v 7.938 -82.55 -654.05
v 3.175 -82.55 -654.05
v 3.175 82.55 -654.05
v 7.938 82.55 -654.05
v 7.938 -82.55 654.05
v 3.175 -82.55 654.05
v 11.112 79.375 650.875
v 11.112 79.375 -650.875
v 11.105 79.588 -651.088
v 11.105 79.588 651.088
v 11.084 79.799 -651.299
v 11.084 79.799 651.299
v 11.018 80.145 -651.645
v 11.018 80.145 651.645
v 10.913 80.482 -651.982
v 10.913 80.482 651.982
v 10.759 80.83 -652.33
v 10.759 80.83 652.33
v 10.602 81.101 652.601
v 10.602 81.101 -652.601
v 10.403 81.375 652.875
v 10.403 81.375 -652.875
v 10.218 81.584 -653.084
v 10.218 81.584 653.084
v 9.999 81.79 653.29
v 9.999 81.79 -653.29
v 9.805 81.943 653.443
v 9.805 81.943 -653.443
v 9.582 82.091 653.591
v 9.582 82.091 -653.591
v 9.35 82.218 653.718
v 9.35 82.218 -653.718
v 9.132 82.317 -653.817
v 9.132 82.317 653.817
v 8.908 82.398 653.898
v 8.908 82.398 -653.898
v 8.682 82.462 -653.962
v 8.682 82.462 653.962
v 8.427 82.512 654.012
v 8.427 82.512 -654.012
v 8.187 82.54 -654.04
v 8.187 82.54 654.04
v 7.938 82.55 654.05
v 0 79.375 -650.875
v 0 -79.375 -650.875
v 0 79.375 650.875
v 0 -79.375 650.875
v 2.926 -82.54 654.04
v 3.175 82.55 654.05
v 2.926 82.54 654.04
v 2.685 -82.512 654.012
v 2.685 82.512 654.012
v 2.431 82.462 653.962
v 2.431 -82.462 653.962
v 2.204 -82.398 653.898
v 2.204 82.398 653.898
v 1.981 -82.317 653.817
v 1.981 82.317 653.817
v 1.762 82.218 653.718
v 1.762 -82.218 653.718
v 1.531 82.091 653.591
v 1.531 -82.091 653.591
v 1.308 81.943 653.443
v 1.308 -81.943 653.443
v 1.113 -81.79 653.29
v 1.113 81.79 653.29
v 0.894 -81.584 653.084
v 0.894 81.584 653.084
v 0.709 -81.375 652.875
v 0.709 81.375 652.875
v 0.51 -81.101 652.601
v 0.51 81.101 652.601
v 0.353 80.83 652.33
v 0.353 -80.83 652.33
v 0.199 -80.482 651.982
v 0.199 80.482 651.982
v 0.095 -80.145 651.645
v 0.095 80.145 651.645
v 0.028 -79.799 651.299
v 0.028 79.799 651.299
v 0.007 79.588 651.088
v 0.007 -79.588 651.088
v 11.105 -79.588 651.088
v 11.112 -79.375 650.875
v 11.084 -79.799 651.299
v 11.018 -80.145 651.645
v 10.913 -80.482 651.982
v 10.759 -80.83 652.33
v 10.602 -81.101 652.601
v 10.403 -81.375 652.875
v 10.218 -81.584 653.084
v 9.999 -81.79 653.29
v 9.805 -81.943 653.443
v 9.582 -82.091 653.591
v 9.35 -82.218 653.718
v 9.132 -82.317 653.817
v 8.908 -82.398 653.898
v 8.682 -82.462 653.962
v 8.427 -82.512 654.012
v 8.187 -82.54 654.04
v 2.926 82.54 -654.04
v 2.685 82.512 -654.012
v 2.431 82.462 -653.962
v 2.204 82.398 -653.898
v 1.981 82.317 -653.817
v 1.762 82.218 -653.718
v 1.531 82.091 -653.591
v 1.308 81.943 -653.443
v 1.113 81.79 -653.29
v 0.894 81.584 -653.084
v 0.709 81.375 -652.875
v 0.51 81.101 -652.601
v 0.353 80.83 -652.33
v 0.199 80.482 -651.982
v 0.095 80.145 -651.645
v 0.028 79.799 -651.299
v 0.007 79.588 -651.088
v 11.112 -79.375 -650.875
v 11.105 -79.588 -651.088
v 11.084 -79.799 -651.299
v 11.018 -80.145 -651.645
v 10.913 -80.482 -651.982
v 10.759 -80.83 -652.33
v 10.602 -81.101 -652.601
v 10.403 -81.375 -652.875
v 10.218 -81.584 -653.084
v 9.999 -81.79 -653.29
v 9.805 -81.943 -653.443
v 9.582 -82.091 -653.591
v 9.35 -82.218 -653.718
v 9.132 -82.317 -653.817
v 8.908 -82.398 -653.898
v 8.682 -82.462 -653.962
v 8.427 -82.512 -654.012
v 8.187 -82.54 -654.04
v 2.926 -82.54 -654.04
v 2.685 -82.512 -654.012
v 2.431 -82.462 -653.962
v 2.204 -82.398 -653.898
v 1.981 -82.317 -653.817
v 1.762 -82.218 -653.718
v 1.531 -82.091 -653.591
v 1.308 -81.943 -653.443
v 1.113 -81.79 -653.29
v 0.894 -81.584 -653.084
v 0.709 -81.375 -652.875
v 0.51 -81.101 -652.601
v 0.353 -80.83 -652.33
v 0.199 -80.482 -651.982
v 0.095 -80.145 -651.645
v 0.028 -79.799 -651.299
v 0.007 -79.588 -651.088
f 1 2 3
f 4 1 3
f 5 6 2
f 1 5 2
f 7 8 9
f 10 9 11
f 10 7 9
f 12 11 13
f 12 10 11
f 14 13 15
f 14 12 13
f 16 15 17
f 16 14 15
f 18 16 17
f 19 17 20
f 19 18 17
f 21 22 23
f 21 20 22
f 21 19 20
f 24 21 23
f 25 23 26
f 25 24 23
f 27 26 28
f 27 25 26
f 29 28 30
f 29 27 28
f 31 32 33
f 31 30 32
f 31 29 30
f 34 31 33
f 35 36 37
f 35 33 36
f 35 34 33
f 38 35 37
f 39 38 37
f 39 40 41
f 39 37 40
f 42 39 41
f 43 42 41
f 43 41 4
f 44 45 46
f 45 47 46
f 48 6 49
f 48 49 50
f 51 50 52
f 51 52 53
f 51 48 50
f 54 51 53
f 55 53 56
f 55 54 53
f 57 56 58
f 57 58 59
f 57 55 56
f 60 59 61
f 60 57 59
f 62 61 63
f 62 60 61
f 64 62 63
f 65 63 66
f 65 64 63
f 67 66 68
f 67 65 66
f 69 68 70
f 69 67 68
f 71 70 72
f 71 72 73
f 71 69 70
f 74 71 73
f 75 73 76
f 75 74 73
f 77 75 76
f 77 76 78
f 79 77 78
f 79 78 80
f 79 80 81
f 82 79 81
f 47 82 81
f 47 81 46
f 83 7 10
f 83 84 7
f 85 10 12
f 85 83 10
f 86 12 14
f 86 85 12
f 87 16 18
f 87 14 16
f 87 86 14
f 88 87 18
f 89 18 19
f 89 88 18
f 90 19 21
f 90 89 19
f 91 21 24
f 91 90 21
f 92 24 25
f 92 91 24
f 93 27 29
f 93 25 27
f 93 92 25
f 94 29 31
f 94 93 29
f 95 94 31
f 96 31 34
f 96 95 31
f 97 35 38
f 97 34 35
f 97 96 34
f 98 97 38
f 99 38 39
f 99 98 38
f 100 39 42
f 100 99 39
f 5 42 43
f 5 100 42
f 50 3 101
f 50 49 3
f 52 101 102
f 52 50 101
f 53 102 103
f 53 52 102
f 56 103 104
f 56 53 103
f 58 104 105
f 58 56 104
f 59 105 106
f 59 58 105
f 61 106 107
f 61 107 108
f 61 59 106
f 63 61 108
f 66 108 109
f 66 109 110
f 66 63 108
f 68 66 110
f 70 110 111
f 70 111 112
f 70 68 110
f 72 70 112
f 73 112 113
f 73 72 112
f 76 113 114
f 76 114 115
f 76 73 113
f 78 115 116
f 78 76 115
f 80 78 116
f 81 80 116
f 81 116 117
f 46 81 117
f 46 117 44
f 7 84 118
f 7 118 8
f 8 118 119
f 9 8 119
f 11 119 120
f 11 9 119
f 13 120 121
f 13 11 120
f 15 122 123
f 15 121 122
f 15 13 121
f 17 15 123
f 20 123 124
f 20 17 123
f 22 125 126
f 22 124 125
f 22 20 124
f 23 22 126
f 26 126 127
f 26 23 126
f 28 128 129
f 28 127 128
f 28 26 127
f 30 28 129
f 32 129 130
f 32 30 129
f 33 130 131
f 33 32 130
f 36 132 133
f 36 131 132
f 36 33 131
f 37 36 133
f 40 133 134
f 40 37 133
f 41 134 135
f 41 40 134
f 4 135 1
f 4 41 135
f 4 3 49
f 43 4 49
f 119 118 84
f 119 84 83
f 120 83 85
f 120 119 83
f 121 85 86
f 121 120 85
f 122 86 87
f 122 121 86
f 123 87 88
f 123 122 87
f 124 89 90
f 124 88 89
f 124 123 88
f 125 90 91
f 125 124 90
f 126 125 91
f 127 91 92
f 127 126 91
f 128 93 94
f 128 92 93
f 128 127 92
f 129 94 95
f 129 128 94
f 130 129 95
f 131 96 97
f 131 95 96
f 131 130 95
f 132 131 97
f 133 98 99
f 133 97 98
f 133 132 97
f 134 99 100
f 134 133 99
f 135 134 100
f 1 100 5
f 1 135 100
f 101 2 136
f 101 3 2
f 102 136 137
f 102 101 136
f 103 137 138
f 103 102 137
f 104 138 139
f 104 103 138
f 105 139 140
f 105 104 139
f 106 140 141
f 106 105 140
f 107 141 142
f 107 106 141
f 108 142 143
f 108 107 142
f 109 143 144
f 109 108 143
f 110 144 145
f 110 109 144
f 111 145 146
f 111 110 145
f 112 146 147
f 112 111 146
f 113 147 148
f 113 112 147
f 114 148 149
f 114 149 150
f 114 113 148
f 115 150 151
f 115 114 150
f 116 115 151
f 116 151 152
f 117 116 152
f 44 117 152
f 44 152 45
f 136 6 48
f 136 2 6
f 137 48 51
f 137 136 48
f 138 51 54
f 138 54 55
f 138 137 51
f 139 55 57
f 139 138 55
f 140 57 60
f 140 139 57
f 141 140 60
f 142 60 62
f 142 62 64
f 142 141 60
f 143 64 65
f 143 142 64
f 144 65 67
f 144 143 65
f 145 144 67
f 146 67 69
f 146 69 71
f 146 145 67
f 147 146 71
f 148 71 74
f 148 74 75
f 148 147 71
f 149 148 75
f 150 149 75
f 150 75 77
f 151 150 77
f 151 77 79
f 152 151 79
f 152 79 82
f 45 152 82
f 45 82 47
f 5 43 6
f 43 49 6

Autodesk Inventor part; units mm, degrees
ref_plane "YZ Plane" through (0, 0, 0) normal (1, 0, 0) x (0, 1, 0)
ref_plane "XZ Plane" through (0, 0, 0) normal (0, 1, 0) x (-1, 0, 0)
ref_plane "XY Plane" through (0, 0, 0) normal (0, 0, 1) x (1, 0, 0)
sketch "Sketch1" plane through (0, 0, 0) normal (1, 0, 0) x (0, 1, 0)
  line L0 (-82.55, 654.05) -> (-82.55, -654.05)
  line L1 (-82.55, -654.05) -> (82.55, -654.05)
  line L2 (82.55, -654.05) -> (82.55, 654.05)
  line L3 (82.55, 654.05) -> (-82.55, 654.05)
  line L4 (-82.55, 654.05) -> (82.55, -654.05) construction
  line L5 (-82.55, -654.05) -> (82.55, 654.05) construction
  point P0 (0, 0)
  dimension "d0" = 1308.1
  dimension "d1" = 165.1
extrude "Extrusion1" add sketch "Sketch1" along normal blind 11.1125
fillet "Fillet1" radius 3.175 8 edges at (11.1125, 82.55, 0) (11.1125, 0, 654.05) (0, -82.55, 0) (11.1125, 0, -654.05) (11.1125, -82.55, 0) (0, 0, 654.05) (0, 82.55, 0) (0, 0, -654.05)
properties part number "Home Depot Composite Slat 51_5 in" material "Wood (Cherry)"
